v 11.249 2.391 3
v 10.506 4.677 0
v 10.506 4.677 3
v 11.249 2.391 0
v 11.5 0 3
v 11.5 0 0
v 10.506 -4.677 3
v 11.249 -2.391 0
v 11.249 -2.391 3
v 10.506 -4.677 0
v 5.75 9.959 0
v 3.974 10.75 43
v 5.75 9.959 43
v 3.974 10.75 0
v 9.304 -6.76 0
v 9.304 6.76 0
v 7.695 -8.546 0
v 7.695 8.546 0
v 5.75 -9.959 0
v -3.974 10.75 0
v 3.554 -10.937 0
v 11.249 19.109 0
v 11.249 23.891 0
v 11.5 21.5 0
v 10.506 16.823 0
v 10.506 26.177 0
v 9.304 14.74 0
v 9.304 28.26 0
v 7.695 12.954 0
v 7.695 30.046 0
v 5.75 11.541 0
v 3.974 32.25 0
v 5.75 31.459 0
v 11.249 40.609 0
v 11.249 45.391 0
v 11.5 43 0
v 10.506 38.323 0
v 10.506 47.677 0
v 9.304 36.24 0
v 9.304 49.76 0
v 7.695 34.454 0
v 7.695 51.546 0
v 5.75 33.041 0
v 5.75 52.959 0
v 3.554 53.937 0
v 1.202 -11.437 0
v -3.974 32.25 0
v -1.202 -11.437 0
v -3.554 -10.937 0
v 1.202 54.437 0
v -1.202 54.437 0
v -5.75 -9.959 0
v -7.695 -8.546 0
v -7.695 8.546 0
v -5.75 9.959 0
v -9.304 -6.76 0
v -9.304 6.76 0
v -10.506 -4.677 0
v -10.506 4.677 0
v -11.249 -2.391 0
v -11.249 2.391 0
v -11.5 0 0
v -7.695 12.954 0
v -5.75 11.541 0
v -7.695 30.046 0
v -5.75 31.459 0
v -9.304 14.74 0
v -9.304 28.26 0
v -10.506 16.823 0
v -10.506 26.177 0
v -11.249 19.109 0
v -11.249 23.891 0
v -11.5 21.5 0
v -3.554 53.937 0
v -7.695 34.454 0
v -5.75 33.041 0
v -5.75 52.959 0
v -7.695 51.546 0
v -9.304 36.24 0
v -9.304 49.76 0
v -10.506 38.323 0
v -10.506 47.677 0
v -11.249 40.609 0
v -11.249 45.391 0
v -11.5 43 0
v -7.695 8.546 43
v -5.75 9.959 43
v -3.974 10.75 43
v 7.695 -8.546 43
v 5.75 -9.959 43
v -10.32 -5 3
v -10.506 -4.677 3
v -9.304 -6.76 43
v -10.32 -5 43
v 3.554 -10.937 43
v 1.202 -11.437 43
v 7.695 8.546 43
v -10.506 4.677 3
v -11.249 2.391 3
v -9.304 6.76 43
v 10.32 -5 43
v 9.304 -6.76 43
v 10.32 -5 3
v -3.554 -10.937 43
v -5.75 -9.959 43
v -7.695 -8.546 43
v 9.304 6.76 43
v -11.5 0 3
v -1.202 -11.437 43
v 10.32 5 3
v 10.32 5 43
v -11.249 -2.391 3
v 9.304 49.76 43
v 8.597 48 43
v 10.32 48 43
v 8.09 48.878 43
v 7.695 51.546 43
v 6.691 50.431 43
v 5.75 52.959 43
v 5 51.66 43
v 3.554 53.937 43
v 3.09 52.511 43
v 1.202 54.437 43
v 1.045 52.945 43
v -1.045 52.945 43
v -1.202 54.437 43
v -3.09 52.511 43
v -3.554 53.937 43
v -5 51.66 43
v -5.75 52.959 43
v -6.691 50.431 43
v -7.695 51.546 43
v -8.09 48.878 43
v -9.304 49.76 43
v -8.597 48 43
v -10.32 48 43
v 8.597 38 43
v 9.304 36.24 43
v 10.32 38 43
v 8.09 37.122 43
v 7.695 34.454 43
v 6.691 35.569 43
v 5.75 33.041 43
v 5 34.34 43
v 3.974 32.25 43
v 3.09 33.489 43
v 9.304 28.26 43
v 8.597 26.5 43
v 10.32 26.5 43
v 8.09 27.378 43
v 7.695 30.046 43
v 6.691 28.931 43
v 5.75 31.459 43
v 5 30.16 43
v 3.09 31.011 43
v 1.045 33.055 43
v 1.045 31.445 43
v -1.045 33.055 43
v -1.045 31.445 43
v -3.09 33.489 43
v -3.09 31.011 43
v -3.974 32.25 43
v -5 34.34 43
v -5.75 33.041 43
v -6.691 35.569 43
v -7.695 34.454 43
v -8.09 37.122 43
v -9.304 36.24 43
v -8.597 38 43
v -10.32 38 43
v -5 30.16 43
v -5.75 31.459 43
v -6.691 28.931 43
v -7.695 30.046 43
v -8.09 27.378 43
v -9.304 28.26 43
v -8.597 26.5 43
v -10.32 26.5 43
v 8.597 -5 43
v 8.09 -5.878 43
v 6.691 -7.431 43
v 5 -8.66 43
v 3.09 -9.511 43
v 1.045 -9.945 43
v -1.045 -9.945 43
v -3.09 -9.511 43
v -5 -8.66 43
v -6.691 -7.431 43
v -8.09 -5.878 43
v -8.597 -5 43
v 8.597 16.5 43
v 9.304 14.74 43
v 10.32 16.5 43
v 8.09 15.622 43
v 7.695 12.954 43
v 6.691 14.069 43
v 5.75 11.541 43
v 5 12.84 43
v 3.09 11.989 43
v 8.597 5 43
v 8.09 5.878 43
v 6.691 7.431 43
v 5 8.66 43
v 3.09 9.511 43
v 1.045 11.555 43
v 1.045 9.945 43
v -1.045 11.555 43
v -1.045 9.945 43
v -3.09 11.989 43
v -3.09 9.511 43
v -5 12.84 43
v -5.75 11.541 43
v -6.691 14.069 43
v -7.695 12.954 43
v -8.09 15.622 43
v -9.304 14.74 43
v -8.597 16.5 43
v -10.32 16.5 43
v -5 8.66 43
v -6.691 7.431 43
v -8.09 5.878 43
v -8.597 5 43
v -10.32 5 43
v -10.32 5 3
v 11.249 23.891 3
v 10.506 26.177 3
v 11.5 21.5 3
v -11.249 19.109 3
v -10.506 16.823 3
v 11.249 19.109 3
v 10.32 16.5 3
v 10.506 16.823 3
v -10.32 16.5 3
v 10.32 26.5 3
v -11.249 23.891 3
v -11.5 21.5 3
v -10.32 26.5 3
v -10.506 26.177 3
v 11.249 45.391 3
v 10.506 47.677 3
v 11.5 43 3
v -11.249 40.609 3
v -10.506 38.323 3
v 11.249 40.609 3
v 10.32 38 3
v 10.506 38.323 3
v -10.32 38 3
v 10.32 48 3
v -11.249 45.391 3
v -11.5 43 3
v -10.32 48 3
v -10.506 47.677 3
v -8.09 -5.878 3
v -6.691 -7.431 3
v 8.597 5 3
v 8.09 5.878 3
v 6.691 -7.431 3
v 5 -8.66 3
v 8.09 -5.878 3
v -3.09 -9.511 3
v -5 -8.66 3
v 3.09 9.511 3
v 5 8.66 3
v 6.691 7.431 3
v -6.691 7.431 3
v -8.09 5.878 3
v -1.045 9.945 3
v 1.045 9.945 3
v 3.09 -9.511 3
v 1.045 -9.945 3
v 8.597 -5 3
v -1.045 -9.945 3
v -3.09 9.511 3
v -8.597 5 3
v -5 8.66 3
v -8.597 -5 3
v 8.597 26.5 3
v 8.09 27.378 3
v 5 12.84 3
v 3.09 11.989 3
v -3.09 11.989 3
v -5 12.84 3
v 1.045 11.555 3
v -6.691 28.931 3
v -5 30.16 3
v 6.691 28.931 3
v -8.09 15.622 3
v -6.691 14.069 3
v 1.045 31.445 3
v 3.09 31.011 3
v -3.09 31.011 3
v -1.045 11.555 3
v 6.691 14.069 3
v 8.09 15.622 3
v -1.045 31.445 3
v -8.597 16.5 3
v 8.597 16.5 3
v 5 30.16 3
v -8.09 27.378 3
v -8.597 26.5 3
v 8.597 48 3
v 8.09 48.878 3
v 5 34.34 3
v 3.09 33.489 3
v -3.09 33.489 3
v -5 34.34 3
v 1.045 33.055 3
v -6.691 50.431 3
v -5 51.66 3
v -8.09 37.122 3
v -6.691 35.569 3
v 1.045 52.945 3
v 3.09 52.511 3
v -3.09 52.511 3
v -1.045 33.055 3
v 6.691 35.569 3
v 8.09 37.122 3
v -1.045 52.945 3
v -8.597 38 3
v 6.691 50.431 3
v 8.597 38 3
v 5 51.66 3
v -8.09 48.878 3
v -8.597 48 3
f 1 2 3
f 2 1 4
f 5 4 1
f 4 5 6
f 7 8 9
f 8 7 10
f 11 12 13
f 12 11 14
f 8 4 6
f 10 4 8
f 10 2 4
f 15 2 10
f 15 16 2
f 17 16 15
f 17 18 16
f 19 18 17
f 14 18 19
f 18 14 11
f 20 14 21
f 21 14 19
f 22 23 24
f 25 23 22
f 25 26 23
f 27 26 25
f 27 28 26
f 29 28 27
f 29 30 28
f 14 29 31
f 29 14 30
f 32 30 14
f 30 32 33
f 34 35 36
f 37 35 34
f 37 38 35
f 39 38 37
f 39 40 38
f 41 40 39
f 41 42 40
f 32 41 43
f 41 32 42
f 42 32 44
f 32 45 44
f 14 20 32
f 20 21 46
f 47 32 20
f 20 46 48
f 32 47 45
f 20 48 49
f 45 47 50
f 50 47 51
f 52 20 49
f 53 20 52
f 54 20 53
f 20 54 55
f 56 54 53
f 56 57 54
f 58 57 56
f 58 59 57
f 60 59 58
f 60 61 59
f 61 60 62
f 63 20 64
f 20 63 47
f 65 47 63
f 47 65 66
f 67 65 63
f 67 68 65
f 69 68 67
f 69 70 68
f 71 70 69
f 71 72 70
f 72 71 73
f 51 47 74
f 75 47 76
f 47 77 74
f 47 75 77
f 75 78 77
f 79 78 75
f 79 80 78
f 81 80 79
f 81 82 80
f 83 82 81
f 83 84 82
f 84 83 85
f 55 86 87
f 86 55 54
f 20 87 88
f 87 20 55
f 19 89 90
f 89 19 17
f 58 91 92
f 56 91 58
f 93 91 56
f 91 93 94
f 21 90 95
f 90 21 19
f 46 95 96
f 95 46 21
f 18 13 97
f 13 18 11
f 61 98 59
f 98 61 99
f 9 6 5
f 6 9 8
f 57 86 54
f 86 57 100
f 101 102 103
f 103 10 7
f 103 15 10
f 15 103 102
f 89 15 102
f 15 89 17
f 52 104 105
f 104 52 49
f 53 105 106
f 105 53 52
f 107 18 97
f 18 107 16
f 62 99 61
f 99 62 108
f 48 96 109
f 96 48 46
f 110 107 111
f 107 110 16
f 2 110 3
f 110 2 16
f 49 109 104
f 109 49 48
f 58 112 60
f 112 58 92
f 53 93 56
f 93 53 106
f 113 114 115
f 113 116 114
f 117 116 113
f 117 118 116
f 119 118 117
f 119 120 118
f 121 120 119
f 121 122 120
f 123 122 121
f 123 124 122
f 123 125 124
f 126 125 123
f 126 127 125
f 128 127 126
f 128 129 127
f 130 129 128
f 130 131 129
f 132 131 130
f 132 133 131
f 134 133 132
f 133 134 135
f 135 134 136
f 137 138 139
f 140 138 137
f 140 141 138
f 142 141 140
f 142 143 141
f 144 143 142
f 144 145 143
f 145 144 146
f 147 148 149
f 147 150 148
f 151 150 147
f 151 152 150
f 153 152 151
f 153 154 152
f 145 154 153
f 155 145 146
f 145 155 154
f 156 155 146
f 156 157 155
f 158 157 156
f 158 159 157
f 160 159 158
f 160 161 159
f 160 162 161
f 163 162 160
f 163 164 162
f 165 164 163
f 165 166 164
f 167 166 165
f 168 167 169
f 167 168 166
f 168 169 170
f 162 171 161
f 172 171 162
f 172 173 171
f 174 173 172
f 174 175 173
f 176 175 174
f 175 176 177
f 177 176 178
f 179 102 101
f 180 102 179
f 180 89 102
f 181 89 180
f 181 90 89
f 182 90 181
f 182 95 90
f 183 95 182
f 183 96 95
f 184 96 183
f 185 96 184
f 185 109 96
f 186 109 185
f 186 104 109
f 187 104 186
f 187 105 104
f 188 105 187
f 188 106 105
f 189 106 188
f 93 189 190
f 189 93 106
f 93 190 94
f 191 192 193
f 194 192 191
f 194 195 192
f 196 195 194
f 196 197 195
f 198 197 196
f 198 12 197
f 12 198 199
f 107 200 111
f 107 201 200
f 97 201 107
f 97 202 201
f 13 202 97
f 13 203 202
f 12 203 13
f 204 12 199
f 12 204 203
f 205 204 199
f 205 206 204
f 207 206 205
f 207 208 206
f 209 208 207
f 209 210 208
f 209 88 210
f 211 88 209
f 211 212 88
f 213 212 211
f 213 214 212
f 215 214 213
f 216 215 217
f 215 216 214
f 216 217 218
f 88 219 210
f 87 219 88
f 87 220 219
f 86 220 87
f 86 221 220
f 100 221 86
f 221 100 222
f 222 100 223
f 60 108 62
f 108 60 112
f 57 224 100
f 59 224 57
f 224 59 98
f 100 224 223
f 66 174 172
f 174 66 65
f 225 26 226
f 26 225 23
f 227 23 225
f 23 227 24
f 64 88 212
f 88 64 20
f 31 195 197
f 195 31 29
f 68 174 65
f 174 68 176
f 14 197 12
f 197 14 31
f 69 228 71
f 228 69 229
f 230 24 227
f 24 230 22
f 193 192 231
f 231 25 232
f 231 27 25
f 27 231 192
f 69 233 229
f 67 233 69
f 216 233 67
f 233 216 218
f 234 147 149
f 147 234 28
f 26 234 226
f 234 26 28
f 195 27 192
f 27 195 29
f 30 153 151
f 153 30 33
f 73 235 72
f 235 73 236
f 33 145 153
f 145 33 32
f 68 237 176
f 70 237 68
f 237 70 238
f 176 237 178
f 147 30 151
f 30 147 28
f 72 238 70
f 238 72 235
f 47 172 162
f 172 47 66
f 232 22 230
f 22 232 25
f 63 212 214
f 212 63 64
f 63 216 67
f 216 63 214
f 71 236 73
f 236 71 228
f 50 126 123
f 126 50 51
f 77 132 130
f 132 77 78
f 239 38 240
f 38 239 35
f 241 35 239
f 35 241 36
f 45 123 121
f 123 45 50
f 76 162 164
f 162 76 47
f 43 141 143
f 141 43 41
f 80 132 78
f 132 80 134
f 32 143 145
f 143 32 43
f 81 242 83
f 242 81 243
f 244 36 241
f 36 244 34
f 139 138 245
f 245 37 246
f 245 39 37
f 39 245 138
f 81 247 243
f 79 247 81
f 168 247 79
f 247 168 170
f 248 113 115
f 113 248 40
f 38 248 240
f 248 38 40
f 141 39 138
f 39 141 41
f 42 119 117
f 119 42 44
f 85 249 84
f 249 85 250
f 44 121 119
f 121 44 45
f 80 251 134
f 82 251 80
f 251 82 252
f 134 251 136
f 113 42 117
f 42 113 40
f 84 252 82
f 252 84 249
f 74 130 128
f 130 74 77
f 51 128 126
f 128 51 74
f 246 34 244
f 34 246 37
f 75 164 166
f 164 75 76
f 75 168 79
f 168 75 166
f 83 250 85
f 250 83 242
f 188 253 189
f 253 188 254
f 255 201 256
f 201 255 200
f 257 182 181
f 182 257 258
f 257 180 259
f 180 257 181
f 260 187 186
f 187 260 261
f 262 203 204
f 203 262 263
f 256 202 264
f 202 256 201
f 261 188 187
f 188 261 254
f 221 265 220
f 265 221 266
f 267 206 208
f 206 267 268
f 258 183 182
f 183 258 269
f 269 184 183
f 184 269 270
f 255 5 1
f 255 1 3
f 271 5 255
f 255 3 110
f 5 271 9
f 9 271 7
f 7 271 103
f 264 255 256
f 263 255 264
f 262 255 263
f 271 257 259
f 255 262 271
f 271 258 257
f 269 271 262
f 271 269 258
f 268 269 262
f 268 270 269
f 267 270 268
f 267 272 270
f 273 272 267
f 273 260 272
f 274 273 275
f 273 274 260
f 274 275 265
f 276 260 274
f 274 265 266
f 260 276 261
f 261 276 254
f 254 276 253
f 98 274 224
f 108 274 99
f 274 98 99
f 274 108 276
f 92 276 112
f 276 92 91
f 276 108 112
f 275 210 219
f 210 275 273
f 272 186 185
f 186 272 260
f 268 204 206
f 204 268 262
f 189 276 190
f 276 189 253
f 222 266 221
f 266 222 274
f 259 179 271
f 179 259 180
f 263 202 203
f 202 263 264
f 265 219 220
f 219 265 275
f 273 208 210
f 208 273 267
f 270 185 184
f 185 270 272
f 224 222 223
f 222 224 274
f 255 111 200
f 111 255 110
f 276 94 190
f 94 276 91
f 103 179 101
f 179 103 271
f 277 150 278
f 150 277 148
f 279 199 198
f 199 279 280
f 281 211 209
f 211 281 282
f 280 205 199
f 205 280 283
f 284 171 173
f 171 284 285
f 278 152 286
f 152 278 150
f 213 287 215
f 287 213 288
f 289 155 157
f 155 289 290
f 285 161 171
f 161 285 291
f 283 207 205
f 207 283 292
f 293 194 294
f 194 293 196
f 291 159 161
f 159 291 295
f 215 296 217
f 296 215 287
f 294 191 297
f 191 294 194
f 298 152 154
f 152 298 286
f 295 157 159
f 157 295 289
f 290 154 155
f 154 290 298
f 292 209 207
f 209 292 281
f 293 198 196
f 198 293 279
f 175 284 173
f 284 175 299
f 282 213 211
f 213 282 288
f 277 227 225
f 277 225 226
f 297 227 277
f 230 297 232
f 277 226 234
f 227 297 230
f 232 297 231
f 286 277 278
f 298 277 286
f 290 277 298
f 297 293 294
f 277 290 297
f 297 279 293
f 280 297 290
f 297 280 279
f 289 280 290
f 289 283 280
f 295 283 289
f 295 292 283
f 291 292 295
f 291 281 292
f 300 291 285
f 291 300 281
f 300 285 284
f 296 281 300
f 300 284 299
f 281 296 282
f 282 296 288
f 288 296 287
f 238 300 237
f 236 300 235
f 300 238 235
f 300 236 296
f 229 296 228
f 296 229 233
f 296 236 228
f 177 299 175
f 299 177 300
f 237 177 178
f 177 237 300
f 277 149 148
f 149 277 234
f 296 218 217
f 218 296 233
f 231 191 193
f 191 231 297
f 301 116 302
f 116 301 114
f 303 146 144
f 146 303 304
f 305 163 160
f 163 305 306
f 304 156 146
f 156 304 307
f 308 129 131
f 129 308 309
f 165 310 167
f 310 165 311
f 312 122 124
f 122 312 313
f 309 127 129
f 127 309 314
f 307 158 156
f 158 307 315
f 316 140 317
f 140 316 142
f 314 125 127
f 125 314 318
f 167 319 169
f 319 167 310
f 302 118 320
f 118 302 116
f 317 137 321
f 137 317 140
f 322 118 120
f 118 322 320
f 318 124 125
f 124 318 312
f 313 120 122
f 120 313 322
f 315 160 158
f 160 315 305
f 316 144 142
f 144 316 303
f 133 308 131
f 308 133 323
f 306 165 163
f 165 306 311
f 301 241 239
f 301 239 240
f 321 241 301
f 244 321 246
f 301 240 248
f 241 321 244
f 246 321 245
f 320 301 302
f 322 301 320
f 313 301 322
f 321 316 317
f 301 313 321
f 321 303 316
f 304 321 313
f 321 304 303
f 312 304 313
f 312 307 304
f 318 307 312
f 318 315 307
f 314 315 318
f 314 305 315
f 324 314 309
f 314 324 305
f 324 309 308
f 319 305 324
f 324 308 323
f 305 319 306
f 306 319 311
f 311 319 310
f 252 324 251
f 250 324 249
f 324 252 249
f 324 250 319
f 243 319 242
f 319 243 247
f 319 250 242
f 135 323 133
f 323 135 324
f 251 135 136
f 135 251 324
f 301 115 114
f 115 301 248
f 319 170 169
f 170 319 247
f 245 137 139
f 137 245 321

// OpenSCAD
//
// Custom Circular Token Holder
//
// Copyright 2016 Julia Valencia
//
// Creative Commons Attribution-NonCommercial 3.0 Unported (CC BY-NC 3.0)
// http://creativecommons.org/licenses/by-nc/3.0/

//diameter(mm) of the hole for the token
diameter = 20;
//height(mm) of the holder
height = 40;
//how thick(mm) the walls are
thk = 3;
//how many holders?
count = 3;
//do you want it to be easily grabable? NOTE: this is to allow creativity! Like making a custom toilet paper holder! or a pencil holder! :D
grab = 1;// [1:Yes,0:No]

radius = diameter/2;
difference (){
    for(i=[0:1:count-1]){
     translate([0,(diameter+thk/2)*i,0])
       cylinder(h=height+thk, d = diameter+thk);
    }
    for(i=[0:1:count]){
     translate([0,(diameter+thk/2)*i,thk])
       cylinder(h=height, d = diameter);
     if (grab == 1){
      translate([-radius-thk/2,(diameter+thk/2)*i+(-radius/2),thk])
       cube([diameter+thk,radius,height]);
     }
    }
}
